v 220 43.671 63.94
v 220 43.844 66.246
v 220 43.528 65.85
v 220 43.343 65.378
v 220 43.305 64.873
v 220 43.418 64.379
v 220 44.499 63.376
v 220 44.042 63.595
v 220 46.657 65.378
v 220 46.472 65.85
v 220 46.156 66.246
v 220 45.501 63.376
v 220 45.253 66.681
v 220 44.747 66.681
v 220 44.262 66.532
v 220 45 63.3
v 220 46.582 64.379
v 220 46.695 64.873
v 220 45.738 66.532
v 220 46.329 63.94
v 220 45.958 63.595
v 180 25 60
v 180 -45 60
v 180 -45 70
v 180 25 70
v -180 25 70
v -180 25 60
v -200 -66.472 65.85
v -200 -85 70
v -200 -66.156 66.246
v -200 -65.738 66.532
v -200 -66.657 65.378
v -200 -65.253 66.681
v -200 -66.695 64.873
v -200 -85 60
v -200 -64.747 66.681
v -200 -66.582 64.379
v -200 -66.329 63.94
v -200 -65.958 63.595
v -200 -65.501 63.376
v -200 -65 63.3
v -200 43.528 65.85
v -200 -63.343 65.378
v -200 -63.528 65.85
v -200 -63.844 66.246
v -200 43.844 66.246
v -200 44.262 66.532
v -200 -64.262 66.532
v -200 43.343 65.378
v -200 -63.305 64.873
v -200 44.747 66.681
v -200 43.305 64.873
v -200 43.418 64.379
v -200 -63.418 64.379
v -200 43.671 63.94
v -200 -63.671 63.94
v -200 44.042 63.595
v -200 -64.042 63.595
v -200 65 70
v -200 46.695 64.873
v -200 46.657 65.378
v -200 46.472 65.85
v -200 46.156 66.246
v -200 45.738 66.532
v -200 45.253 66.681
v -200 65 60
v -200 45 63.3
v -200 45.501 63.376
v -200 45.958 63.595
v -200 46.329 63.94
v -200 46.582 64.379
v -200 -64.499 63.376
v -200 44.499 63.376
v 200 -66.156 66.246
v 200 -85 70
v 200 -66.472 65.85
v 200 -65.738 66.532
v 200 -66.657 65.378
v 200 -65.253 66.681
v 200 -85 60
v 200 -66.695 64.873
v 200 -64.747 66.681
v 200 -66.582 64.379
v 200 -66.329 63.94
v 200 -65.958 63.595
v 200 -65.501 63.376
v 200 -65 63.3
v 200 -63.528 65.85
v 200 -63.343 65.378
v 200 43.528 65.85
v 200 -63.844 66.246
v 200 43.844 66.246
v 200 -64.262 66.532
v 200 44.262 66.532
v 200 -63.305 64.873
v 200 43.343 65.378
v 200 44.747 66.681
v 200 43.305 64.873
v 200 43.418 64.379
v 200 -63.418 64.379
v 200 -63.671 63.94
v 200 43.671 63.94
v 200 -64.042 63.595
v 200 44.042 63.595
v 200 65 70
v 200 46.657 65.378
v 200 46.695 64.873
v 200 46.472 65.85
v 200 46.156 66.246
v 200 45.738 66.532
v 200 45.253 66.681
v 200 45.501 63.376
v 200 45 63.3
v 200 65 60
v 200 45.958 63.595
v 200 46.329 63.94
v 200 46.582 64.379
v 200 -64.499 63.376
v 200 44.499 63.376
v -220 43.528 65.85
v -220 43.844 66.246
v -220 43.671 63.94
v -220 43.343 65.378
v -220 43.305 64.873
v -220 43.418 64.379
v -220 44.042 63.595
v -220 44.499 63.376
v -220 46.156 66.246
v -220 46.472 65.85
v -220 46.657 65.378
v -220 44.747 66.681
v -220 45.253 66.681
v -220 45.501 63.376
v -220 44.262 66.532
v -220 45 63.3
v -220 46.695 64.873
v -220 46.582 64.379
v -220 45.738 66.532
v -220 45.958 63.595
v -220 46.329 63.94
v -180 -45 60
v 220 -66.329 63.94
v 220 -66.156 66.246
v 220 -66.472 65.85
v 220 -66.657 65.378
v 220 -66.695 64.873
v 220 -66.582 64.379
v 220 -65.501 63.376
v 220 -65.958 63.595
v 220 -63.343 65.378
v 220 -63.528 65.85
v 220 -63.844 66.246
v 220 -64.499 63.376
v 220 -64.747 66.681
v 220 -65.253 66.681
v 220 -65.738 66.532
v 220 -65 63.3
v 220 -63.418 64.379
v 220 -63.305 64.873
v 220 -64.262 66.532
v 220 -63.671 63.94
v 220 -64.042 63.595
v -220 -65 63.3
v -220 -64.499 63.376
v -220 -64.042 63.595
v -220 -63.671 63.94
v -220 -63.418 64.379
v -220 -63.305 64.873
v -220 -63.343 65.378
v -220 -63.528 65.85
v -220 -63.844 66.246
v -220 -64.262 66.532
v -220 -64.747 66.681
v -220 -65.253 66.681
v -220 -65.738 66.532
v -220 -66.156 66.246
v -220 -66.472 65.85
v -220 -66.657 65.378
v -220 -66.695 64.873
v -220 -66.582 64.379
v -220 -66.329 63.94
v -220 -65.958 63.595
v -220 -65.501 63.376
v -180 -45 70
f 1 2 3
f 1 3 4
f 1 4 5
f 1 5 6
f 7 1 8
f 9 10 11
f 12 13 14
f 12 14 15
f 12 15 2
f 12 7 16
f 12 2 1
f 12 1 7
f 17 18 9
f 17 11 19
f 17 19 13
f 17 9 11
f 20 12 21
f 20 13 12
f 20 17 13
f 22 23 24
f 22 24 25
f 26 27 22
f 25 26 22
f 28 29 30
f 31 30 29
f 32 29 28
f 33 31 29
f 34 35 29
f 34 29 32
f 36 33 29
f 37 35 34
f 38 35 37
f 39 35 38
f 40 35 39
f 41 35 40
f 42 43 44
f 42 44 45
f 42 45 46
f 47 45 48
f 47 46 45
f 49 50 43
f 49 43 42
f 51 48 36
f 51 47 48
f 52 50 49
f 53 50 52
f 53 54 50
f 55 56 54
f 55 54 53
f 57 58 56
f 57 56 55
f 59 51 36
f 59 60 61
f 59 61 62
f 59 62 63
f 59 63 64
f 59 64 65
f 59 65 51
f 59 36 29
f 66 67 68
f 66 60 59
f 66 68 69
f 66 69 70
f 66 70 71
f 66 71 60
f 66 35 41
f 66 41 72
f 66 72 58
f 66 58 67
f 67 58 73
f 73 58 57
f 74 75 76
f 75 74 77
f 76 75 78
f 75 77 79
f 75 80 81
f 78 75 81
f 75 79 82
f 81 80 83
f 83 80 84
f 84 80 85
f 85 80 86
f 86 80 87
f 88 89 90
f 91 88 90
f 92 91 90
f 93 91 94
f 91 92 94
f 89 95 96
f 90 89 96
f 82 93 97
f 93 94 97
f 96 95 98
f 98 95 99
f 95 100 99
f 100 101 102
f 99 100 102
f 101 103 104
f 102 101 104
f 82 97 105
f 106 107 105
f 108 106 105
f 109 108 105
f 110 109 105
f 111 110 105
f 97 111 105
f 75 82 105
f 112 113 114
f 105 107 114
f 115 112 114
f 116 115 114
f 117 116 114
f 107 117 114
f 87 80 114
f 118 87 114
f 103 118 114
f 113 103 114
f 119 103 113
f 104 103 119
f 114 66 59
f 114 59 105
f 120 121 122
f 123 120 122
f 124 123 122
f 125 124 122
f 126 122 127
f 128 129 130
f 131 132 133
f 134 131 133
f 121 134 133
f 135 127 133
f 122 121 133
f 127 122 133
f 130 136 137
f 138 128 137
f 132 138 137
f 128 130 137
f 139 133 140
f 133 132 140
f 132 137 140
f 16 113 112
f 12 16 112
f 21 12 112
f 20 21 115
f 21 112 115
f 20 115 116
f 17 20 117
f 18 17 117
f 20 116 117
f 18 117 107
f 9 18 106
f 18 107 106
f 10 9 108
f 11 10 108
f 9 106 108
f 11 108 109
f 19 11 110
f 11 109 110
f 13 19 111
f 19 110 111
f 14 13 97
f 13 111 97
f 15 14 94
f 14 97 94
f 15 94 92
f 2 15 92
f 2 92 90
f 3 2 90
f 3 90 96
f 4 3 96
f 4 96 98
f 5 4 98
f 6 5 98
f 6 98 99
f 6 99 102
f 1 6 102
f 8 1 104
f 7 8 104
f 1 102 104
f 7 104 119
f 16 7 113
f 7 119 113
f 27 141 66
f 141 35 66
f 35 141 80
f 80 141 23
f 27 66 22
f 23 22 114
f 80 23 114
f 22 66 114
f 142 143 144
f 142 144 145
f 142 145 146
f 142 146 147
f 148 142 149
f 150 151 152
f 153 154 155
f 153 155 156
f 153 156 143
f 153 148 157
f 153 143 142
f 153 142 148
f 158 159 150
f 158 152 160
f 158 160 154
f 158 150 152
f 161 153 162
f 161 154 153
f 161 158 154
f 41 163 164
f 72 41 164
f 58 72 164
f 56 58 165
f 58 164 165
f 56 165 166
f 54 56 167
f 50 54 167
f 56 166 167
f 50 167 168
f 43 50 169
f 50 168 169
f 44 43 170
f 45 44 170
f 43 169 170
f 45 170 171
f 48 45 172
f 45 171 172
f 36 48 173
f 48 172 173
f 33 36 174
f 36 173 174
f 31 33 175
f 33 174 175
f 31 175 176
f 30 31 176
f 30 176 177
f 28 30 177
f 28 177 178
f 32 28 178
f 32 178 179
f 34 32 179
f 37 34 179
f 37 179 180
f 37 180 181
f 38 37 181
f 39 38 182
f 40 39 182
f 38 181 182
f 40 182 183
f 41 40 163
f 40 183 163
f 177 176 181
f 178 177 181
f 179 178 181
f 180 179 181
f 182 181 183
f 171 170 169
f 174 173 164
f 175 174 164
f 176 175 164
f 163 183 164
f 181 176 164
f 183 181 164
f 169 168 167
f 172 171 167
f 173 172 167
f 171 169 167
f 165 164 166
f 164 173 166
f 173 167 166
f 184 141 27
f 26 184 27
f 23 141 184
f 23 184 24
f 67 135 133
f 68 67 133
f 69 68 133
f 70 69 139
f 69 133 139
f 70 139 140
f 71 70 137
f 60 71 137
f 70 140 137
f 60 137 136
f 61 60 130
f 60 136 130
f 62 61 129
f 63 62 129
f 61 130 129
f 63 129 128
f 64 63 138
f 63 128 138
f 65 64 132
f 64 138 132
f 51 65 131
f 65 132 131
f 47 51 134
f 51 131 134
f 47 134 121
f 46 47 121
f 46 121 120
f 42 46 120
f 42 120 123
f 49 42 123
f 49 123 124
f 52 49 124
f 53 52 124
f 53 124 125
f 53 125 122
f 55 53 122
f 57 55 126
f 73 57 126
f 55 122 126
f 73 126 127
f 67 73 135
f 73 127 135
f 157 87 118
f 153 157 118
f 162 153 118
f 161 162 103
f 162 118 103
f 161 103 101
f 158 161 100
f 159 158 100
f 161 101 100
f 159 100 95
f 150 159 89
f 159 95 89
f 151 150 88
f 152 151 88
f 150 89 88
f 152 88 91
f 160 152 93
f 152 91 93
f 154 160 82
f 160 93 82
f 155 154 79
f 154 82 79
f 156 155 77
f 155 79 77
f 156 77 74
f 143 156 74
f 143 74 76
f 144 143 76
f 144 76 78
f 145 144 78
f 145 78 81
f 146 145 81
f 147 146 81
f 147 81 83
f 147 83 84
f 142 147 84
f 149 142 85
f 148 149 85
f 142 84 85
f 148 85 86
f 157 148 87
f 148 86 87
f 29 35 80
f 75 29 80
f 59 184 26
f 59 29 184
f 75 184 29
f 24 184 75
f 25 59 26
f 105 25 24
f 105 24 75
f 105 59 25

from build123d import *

# Parameters (mm, degrees)
SKETCH013_W             = 400
SKETCH013_H             = 150
SKETCH013_W_2           = 360
SKETCH013_H_2           = 70
PAD013_DEPTH            = 10
CYLINDER013_R           = 1.7
CYLINDER013_DEPTH       = 20
CYLINDER013_PITCH_ANGLE = 90
CYLINDER015_R           = 1.7
CYLINDER015_DEPTH       = 20
CYLINDER015_PITCH_ANGLE = 90
CYLINDER016_R           = 1.7
CYLINDER016_DEPTH       = 20
CYLINDER016_PITCH_ANGLE = 90
CYLINDER017_R           = 1.7
CYLINDER017_DEPTH       = 20
CYLINDER017_PITCH_ANGLE = 90


with BuildPart() as pad013:
    # Sketch013 → Pad013 (new body)
    with BuildSketch(Plane(origin=(0, -10, 60), x_dir=(1, 0, 0), z_dir=(0, 0, 1))):
        Rectangle(SKETCH013_W, SKETCH013_H)
        Rectangle(SKETCH013_W_2, SKETCH013_H_2, mode=Mode.SUBTRACT)
    extrude(amount=PAD013_DEPTH)


with BuildPart() as cylinder013:
    # Cylinder013 → Cylinder013 (new body)
    with BuildSketch(Plane.XY):
        Circle(CYLINDER013_R)
    extrude(amount=CYLINDER013_DEPTH)


with BuildPart() as cylinder013_1:
    # Cylinder013 pitch: moved
    add(cylinder013.part.rotate(Axis((0, 0, 0), (0, 1, 0)), CYLINDER013_PITCH_ANGLE))


with BuildPart() as cylinder013_2:
    # Cylinder013 placement: moved
    add(cylinder013_1.part.moved(Location((200, -65, 65))))


with BuildPart() as cylinder015:
    # Cylinder015 → Cylinder015 (new body)
    with BuildSketch(Plane.XY):
        Circle(CYLINDER015_R)
    extrude(amount=CYLINDER015_DEPTH)


with BuildPart() as cylinder015_1:
    # Cylinder015 pitch: moved
    add(cylinder015.part.rotate(Axis((0, 0, 0), (0, 1, 0)), CYLINDER015_PITCH_ANGLE))


with BuildPart() as cylinder015_2:
    # Cylinder015 placement: moved
    add(cylinder015_1.part.moved(Location((-220, -65, 65))))


with BuildPart() as cylinder016:
    # Cylinder016 → Cylinder016 (new body)
    with BuildSketch(Plane.XY):
        Circle(CYLINDER016_R)
    extrude(amount=CYLINDER016_DEPTH)


with BuildPart() as cylinder016_1:
    # Cylinder016 pitch: moved
    add(cylinder016.part.rotate(Axis((0, 0, 0), (0, 1, 0)), CYLINDER016_PITCH_ANGLE))


with BuildPart() as cylinder016_2:
    # Cylinder016 placement: moved
    add(cylinder016_1.part.moved(Location((-220, 45, 65))))


with BuildPart() as fusion005:
    # Cylinder017 → Cylinder017 (new body)
    with BuildSketch(Plane.XY):
        Circle(CYLINDER017_R)
    extrude(amount=CYLINDER017_DEPTH)


with BuildPart() as fusion005_1:
    # Cylinder017 pitch: moved
    add(fusion005.part.rotate(Axis((0, 0, 0), (0, 1, 0)), CYLINDER017_PITCH_ANGLE))


with BuildPart() as fusion005_2:
    # Cylinder017 placement: moved
    add(fusion005_1.part.moved(Location((200, 45, 65))))

    # Fusion004: union Cylinder013, Cylinder015, Cylinder016
    add(cylinder013_2.part)
    add(cylinder015_2.part)
    add(cylinder016_2.part)

    # Fusion005: union Pad013
    add(pad013.part)


solid = fusion005_2.part
